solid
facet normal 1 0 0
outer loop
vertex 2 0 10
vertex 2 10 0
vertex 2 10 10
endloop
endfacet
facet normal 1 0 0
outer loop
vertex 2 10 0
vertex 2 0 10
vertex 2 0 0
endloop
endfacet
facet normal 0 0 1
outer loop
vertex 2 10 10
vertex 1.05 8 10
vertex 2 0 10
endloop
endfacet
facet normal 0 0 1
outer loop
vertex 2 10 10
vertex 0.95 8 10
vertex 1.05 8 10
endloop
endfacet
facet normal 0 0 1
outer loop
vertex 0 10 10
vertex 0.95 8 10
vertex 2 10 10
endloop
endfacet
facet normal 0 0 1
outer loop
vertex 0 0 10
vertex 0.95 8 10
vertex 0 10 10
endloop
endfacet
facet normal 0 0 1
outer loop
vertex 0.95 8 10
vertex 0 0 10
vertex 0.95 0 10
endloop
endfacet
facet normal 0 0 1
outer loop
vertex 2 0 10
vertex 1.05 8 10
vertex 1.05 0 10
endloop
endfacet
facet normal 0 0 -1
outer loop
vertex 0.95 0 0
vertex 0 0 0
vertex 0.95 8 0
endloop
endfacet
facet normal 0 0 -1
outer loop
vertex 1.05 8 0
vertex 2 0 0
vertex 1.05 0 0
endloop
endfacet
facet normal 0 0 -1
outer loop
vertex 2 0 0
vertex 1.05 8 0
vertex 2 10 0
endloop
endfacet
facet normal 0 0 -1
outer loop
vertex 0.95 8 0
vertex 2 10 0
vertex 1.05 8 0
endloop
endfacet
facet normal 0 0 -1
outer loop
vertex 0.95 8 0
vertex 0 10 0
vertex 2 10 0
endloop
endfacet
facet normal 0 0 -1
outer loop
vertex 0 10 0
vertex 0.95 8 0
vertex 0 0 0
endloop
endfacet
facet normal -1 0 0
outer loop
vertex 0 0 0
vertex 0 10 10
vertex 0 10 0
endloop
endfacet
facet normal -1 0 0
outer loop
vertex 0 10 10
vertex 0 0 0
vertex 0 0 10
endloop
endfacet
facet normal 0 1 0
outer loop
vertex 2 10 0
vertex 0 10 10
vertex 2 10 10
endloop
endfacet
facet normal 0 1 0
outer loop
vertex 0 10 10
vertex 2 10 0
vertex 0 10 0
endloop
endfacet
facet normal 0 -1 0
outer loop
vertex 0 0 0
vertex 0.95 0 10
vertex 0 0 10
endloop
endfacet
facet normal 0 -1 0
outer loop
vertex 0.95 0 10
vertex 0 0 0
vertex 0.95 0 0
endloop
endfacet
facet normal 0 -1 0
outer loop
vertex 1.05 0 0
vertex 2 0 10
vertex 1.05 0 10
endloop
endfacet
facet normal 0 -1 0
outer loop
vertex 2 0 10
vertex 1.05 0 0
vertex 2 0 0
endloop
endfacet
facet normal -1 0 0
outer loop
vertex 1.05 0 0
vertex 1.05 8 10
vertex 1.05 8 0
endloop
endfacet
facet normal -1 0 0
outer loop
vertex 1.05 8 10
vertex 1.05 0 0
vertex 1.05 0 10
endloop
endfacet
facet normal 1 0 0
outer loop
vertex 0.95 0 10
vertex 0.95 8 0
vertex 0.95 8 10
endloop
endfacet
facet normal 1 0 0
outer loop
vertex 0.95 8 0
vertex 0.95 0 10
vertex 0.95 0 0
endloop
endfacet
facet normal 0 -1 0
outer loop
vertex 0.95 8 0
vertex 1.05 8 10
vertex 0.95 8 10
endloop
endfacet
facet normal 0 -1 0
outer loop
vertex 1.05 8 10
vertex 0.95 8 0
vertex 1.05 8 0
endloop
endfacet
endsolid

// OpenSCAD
// a simple clit that is essentially a cube with aslit in it
// it gets fixed on a paper shade preventing it from slipping out from its place

gap = 0.1;
width = 2;
epsilon = 0.01;
side = 10;

difference() {
    cube([width, side, side]);
    translate([(width-gap)/2, -2*epsilon, -2*epsilon])
        cube([gap, side-width+2*epsilon, side + 3*epsilon]);
}
